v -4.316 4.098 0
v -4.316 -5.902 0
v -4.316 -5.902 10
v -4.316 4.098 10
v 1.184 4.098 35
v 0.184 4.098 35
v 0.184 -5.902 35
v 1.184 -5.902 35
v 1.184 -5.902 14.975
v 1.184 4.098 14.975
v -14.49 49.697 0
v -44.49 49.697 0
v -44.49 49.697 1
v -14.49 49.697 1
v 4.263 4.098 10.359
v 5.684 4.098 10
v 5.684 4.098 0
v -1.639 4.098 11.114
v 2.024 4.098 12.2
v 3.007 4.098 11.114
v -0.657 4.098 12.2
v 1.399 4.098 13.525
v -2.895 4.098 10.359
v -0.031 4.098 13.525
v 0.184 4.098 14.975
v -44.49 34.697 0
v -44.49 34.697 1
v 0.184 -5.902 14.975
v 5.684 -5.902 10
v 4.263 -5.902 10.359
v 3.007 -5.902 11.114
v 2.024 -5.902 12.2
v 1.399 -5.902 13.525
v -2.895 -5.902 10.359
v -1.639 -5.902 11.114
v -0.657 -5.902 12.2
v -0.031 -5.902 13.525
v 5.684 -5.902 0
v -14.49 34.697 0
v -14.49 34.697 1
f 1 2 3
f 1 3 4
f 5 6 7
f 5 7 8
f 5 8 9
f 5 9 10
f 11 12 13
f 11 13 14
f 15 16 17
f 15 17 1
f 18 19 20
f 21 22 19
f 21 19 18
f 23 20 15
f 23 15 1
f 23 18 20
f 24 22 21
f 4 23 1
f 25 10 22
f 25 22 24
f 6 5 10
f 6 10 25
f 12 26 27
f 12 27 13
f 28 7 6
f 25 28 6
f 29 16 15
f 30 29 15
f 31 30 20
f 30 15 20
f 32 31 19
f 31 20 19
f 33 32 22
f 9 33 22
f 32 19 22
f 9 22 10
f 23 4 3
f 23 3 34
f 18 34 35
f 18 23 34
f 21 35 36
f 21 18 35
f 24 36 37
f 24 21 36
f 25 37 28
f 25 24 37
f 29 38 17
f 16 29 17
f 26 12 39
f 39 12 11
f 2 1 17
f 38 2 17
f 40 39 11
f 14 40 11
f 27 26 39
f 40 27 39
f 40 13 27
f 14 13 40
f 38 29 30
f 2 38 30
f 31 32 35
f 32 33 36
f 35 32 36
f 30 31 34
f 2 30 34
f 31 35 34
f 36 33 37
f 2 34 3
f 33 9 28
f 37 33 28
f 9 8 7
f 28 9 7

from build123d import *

# Parameters (mm, degrees)
F0_W        = 30
F0_H        = 15
F1_DEPTH    = 1
F2_W        = 10
F2_H        = 10
F3_DEPTH    = 10
F4_W        = 0.5
F4_H        = 10
F5_DEPTH    = 25
F6_T1_DEPTH = 10


# Not quite as in the source:
# - a fillet or chamfer that OpenCascade refuses, or shapes differently, is made with other operations: its cross-section is extruded or revolved along the edge and cut away or added


with BuildPart() as f1:
    # F0 (on Top) → F1 (new body)
    with BuildSketch(Plane.XY):
        with Locations((-29.4897666946, 42.1969963853)):
            Rectangle(F0_W, F0_H)
    extrude(amount=F1_DEPTH)


with BuildPart() as f3:
    # F2 (on Top) → F3 (new body)
    with BuildSketch(Plane.XY):
        with Locations((0.6839325652, -0.9021522023)):
            Rectangle(F2_W, F2_H)
    extrude(amount=F3_DEPTH)

    # F4 (on face) → F5 (join)
    with BuildSketch(Plane.XY.offset(10)):
        with Locations((0.4339325652, -0.9021522023)):
            Rectangle(F4_W, F4_H)
        with Locations((0.9339325652, -0.9021522023)):
            Rectangle(F4_W, F4_H)
    extrude(amount=F5_DEPTH)

    # F6: fillet of radius 5 on 2 edges, made by hand

    # F6_s2 → F6_t1 (join)
    with BuildSketch(Plane.XZ.offset(-4.0978477977)):
        with BuildLine():
            ThreePointArc((-4.3160674348, 10), (-1.1079681913, 11.6208352193), (0.1839325652, 14.9749371855))
            Line((0.1839325652, 14.9749371855), (0.1839325652, 10))
            Line((0.1839325652, 10), (-4.3160674348, 10))
        make_face()
        with BuildLine():
            ThreePointArc((5.6839325652, 10), (2.4758333216, 11.6208352193), (1.1839325652, 14.9749371855))
            Line((1.1839325652, 14.9749371855), (1.1839325652, 10))
            Line((1.1839325652, 10), (5.6839325652, 10))
        make_face()
    extrude(amount=F6_T1_DEPTH)


solid = Compound([f1.part, f3.part])
